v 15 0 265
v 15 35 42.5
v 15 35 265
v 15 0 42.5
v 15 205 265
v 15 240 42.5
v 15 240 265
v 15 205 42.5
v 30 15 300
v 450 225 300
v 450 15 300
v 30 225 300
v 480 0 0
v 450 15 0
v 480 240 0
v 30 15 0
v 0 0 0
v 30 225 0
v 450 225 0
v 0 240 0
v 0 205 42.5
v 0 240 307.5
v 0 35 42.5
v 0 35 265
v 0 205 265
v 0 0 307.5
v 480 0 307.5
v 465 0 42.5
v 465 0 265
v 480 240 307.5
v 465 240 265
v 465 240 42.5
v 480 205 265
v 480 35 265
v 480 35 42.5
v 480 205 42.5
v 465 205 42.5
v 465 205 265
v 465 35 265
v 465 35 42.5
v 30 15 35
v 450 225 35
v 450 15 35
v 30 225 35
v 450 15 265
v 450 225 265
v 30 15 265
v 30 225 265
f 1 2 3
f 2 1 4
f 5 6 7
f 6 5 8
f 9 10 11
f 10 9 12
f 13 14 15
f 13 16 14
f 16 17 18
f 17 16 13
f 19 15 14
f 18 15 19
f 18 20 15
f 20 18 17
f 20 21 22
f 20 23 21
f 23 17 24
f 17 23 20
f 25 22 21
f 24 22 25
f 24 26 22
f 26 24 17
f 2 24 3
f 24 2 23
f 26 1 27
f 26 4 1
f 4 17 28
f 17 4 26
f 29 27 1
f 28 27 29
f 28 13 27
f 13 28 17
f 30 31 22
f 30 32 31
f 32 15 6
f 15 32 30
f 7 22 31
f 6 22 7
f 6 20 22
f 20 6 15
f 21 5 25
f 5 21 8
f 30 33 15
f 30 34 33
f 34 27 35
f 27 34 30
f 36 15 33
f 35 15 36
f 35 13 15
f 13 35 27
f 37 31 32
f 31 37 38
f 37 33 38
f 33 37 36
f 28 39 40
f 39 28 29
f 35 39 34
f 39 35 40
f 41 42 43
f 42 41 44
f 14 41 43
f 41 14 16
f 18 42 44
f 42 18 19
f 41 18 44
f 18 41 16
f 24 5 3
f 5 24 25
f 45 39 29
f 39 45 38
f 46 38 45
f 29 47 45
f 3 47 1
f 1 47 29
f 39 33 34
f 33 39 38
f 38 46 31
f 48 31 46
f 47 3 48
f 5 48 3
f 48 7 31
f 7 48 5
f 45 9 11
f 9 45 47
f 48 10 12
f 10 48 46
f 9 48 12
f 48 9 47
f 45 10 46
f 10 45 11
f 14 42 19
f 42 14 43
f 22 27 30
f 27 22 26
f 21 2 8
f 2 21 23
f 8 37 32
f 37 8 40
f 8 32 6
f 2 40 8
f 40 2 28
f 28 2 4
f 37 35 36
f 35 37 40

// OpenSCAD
// inch = 25.4;
inch = 10;

// x
two_x_four_thickness = 1.5 * inch;
// y
two_x_four_width = 3.5 * inch;

// z
leg_length = 30 * inch;

// x
top_width = 48 * inch;
// y
top_depth = 24 * inch;
// z
top_thickness = 0.75 * inch;

module two_by_four(length) {   
    cube([two_x_four_thickness, two_x_four_width, length]);
}

module leg() {
    color([1, 0, 0]) {
        two_by_four(leg_length);
    }
}


module crossbrace() {
    // short crossbrace
    translate([0, (top_depth - two_x_four_width), 0]) {
        rotate([90, 0, 0]) {
            color([0, .5, 0]) {
                two_by_four(top_depth - (two_x_four_width * 2));
            }
        }
    }

    // long crossbrace
    translate([two_x_four_thickness, (top_depth - two_x_four_thickness), 0]) {
        rotate([90, 0, 0]) {
            color([.5, 0, 0]) {
                two_by_four(top_depth - (two_x_four_thickness * 2));
            }
        }
    }
}

// LEGS
union() {
    // leg 1
    leg();
    // leg 2
    translate([0, (top_depth - two_x_four_width), 0]) {
        leg();
    }
    // leg 3
    translate([(top_width - two_x_four_thickness), (top_depth - two_x_four_width), 0]) {
        leg();
    }
    // leg 4
    translate([(top_width - two_x_four_thickness), 0, 0]) {
        leg();
    }
}

// CROSSBRACES
union() {
// SHEETS
union() {
    // leg 1 & 2 top crossbrace
    translate([0, 0, (leg_length - two_x_four_width)]) {
        crossbrace();
    }

    // leg 1 & 2 bottom crossbrace
    crossbrace();
    // leg 3 & 4 top crossbrace
    translate([top_width, 0, leg_length]) { {
        rotate([0, 180, 0])
            crossbrace();
        }    
    }
    // leg 3 & 4 bottom crossbrace
    translate([top_width, 0, two_x_four_width]) { {
        rotate([0, 180, 0])
            crossbrace();
        }    
    }
    // front bottom crossbrace
    translate([two_x_four_thickness, 0, 0]) {
        rotate([90, 0, 90]) {
            color([0, 1, 0]) {
                two_by_four(top_width - (two_x_four_thickness * 2));
            }
        }
    }
    // back bottom crossbrace
    translate([two_x_four_thickness, (top_depth - two_x_four_thickness), 0]) {
        rotate([90, 0, 90]) {
            color([0, 1, 0]) {
                two_by_four(top_width - (two_x_four_thickness * 2));
            }
        }
    }
    // front top crossbrace
    translate([two_x_four_thickness, 0, (leg_length - two_x_four_width)]) {
        rotate([90, 0, 90]) {
            color([0, 1, 0]) {
                two_by_four(top_width - (two_x_four_thickness * 2));
            }
        }
    }
    // back top crossbrace
    translate([two_x_four_thickness, (top_depth - two_x_four_thickness), (leg_length - two_x_four_width)]) {
        rotate([90, 0, 90]) {
            color([0, 1, 0]) {
                two_by_four(top_width - (two_x_four_thickness * 2));
            }
        }
    }
}

    // top
    translate([0, 0, leg_length]) {
        color([0, 0, 1]) {
            cube([top_width, top_depth, top_thickness]);
        }
    }

    // bottom
    translate([0, 0, two_x_four_width]) {
        color([0, 0, 1]) {
            cube([top_width, top_depth, top_thickness]);
        }
    }
}
